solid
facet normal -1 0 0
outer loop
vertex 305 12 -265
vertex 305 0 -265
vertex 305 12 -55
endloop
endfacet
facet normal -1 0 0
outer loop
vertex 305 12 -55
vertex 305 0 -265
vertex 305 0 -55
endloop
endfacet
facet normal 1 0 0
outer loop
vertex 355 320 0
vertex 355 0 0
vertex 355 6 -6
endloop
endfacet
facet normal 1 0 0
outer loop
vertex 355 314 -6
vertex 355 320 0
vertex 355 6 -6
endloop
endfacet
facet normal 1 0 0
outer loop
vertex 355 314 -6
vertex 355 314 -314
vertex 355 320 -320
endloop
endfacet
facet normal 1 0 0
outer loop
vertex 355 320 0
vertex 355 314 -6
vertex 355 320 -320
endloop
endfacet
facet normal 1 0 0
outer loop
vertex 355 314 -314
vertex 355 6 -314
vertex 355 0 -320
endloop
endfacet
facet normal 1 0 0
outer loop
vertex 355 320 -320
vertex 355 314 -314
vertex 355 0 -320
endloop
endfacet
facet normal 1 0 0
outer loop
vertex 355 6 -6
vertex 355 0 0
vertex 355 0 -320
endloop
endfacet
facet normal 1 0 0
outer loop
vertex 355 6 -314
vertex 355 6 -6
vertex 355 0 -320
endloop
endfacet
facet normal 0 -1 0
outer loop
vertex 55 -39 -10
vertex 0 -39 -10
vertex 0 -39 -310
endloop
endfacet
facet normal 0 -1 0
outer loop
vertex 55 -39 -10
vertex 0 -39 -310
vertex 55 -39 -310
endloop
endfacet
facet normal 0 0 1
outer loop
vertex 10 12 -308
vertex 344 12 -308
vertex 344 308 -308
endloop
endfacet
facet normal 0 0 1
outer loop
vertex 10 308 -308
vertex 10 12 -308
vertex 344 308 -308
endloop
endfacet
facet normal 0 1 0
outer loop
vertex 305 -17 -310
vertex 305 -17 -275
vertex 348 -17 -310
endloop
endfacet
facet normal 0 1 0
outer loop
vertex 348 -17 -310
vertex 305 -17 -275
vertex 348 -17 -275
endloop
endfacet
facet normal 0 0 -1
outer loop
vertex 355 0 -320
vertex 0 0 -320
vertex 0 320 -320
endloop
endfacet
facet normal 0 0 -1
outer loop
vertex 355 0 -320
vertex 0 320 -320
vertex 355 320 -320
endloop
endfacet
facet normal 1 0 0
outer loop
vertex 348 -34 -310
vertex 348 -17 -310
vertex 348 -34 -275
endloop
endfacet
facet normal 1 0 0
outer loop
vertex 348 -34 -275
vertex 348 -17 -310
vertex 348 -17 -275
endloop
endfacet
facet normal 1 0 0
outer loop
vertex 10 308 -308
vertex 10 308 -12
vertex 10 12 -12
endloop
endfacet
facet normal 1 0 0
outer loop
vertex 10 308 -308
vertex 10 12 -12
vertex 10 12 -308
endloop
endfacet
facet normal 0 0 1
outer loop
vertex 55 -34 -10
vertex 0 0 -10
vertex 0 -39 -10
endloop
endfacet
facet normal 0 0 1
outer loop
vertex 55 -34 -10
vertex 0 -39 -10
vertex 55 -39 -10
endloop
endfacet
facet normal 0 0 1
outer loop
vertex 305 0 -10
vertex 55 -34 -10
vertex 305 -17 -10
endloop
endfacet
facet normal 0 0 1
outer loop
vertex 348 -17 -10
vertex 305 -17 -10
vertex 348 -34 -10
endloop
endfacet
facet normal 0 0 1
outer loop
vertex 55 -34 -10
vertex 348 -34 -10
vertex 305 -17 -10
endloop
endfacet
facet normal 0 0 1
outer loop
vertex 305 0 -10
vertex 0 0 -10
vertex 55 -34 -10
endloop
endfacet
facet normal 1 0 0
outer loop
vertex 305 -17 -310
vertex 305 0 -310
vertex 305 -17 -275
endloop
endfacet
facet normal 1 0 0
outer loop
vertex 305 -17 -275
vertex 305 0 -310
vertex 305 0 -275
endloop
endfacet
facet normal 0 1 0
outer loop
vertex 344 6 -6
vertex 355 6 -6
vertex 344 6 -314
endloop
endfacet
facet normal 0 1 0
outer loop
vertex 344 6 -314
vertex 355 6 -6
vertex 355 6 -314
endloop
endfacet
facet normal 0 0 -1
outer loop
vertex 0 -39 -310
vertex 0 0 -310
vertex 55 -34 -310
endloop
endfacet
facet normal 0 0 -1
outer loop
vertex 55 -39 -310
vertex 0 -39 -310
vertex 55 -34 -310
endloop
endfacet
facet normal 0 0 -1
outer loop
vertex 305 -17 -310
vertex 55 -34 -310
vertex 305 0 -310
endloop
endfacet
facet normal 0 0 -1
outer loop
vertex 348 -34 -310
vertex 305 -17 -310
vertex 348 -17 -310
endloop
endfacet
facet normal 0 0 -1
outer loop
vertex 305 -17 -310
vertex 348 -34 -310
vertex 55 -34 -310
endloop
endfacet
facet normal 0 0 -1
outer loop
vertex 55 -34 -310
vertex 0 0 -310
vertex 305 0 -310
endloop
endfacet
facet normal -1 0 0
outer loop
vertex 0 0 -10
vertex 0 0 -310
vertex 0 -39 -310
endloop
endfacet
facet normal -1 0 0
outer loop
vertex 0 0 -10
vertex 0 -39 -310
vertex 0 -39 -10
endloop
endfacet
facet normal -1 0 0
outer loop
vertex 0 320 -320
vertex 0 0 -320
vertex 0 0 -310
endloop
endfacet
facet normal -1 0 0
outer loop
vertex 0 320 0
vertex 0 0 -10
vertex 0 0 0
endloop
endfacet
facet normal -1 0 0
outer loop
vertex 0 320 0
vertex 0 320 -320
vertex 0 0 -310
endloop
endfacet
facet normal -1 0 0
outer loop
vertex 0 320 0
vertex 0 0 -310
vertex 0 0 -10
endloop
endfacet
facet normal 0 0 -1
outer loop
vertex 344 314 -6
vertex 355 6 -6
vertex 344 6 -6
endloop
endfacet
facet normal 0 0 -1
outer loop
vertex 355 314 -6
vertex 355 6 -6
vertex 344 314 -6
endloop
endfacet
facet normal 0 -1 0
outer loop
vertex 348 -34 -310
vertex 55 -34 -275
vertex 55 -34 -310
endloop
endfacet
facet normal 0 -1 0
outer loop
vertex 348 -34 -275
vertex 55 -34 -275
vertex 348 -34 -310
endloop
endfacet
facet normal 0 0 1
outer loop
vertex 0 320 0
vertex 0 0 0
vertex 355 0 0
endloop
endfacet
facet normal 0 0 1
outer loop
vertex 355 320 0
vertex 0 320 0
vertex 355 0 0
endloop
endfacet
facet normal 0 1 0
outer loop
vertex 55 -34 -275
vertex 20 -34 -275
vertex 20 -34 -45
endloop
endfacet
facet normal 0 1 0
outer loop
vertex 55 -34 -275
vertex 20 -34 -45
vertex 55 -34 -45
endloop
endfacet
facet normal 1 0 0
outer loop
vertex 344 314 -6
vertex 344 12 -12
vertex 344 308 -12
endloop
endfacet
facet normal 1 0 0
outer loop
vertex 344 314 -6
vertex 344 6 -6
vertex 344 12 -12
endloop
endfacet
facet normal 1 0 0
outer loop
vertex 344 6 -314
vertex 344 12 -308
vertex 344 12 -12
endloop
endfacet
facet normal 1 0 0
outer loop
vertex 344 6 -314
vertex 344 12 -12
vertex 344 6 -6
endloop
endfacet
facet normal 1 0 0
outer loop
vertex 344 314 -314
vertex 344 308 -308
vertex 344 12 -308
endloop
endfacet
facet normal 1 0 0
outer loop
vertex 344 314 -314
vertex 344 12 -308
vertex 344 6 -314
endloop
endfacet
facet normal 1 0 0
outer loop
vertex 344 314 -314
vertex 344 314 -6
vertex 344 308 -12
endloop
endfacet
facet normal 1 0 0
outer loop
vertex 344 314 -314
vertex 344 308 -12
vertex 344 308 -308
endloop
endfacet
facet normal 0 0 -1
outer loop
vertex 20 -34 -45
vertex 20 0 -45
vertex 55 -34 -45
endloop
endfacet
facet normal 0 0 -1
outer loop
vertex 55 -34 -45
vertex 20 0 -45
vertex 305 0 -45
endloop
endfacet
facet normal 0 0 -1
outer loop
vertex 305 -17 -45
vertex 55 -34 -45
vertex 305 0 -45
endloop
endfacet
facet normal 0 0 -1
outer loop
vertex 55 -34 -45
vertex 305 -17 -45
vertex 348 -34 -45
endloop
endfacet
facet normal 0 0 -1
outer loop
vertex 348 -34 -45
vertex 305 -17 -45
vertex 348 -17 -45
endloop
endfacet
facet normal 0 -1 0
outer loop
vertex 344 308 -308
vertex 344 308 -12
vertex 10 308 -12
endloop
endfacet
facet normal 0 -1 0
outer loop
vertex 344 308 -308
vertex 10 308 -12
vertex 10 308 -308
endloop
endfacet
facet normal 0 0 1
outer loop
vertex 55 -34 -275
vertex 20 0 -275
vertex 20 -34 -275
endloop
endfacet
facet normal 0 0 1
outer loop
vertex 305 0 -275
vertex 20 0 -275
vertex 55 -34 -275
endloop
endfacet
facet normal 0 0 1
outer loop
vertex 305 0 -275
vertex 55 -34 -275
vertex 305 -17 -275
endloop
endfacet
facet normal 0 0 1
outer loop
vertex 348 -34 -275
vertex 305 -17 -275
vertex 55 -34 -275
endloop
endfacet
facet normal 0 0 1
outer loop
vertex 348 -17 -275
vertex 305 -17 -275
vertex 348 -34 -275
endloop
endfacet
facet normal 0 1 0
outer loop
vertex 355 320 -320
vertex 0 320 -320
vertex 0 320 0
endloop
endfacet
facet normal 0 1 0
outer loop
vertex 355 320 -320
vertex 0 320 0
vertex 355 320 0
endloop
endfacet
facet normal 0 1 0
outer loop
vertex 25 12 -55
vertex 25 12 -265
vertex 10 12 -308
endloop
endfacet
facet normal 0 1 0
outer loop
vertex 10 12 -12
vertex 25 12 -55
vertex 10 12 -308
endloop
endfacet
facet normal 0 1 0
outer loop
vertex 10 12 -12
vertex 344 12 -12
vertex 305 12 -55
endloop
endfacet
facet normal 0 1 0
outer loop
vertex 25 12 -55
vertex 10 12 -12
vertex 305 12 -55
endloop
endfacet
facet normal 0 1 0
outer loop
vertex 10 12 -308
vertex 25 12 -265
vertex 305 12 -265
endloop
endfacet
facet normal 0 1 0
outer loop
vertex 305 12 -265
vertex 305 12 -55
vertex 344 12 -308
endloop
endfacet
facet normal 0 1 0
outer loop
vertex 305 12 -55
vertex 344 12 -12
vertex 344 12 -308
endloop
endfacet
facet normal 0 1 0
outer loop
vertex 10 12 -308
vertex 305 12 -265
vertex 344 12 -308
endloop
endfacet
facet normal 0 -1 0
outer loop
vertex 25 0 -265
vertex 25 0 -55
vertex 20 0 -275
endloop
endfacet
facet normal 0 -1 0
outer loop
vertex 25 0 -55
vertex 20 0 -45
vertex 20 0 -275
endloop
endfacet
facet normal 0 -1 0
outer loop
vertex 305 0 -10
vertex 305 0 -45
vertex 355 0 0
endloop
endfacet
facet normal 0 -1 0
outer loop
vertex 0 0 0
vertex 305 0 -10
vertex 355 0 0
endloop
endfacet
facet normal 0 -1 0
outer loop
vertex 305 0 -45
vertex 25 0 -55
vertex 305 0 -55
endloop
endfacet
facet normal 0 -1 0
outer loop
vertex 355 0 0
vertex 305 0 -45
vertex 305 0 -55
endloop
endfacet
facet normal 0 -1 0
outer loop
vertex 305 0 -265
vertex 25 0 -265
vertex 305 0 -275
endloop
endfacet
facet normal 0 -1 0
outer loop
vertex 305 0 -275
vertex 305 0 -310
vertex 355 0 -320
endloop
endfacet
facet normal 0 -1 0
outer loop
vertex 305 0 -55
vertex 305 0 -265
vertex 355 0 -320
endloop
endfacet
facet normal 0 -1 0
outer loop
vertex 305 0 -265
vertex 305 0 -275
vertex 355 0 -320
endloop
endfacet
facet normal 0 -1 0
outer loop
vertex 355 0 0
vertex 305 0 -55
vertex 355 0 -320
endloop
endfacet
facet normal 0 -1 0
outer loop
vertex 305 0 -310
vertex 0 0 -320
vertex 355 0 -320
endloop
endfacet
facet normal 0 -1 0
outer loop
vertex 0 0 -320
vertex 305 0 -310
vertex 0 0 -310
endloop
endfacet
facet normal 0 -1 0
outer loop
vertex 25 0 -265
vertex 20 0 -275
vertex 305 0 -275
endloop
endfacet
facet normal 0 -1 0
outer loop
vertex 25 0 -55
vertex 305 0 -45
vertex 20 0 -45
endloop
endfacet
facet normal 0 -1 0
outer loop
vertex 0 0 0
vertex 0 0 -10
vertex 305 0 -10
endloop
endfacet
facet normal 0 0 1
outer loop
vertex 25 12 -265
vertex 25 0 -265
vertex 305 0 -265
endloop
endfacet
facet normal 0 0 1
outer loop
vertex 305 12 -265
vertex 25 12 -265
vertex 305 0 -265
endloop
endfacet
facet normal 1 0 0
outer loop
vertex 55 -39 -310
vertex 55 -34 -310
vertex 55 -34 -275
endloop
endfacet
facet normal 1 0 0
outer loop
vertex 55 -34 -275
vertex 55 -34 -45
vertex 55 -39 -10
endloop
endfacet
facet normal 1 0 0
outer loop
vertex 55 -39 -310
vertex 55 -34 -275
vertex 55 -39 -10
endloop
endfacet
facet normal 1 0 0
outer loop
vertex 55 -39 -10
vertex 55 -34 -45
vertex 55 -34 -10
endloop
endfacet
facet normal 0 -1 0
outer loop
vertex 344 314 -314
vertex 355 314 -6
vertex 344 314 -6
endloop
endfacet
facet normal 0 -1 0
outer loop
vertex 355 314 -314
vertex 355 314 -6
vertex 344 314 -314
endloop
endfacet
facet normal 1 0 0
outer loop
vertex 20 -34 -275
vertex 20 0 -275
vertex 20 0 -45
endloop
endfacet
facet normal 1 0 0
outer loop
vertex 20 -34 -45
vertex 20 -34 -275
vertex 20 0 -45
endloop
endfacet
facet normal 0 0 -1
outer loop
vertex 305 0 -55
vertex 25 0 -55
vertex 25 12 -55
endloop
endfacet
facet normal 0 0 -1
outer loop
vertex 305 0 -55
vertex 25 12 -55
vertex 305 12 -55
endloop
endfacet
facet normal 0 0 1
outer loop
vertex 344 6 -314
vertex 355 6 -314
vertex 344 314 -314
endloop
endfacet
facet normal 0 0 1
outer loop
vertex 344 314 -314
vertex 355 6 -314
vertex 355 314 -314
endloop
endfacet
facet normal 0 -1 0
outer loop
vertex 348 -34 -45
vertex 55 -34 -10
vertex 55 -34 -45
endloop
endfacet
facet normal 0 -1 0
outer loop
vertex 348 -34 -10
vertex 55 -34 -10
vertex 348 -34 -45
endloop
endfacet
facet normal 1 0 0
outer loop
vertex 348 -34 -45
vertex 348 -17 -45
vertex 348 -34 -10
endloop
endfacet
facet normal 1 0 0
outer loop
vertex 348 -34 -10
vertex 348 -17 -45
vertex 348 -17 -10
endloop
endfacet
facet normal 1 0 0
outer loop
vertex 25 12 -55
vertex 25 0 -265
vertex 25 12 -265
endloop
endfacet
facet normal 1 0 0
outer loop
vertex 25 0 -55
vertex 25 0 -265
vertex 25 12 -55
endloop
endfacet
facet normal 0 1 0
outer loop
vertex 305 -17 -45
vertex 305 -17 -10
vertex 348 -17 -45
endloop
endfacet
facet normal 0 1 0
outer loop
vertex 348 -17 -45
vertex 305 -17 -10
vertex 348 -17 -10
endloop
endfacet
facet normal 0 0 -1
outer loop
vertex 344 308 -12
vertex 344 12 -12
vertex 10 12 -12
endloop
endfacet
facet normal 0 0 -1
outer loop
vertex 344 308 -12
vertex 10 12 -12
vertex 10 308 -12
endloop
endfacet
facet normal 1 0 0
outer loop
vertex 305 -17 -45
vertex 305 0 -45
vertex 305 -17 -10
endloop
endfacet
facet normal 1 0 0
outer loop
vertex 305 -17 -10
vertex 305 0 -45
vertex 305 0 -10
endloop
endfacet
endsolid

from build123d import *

# Parameters (mm, degrees)
SKETCH1_W            = 355
SKETCH1_H            = 320
BOSS_EXTRUDE1_DEPTH  = 320
SKETCH9_W            = 296
SKETCH9_H            = 296
CUT_EXTRUDE3_DEPTH   = 345
SKETCH10_W           = 308
SKETCH10_H           = 308
CUT_EXTRUDE4_DEPTH   = 11
SKETCH11_W           = 280
SKETCH11_H           = 210
CUT_EXTRUDE5_DEPTH   = 20
SKETCH12_W           = 285
SKETCH12_H           = 35
BOSS_EXTRUDE4_DEPTH  = 17
SKETCH14_W           = 285
SKETCH14_H           = 35
BOSS_EXTRUDE5_DEPTH  = 17
SKETCH15_W           = 328
SKETCH15_H           = 35
BOSS_EXTRUDE6_DEPTH  = 17
SKETCH16_W           = 35
SKETCH16_H           = 300
BOSS_EXTRUDE7_DEPTH  = 5
SKETCH18_W           = 20
SKETCH18_H           = 300
BOSS_EXTRUDE10_DEPTH = 39


with BuildPart() as part:
    # Sketch1 → Boss-Extrude1 (new body)
    with BuildSketch(Plane(origin=(0, 0, 0), x_dir=(1, 0, 0), z_dir=(0, 1, 0))):
        with Locations((177.5, 160)):
            Rectangle(SKETCH1_W, SKETCH1_H)
    extrude(amount=BOSS_EXTRUDE1_DEPTH)

    # Sketch9 → Cut-Extrude3 (cut)
    with BuildSketch(Plane(origin=(355, 0, 0), x_dir=(0, 0, -1), z_dir=(1, 0, 0))):
        with Locations((160, 160)):
            Rectangle(SKETCH9_W, SKETCH9_H)
    extrude(amount=-CUT_EXTRUDE3_DEPTH, mode=Mode.SUBTRACT)

    # Sketch10 → Cut-Extrude4 (cut)
    with BuildSketch(Plane(origin=(355, 0, 0), x_dir=(0, 0, -1), z_dir=(1, 0, 0))):
        with Locations((160, 160)):
            Rectangle(SKETCH10_W, SKETCH10_H)
    extrude(amount=-CUT_EXTRUDE4_DEPTH, mode=Mode.SUBTRACT)

    # Sketch11 → Cut-Extrude5 (cut)
    with BuildSketch(Plane.XZ):
        with Locations((165, -160)):
            Rectangle(SKETCH11_W, SKETCH11_H)
    extrude(amount=-CUT_EXTRUDE5_DEPTH, mode=Mode.SUBTRACT)

    # Sketch12 → Boss-Extrude4 (add)
    with BuildSketch(Plane.XZ):
        with Locations((162.5, -27.5)):
            Rectangle(SKETCH12_W, SKETCH12_H)
    extrude(amount=BOSS_EXTRUDE4_DEPTH)

    # Sketch14 → Boss-Extrude5 (add)
    with BuildSketch(Plane.XZ):
        with Locations((162.5, -292.5)):
            Rectangle(SKETCH14_W, SKETCH14_H)
    extrude(amount=BOSS_EXTRUDE5_DEPTH)

    # Sketch15 → Boss-Extrude6 (add)
    with BuildSketch(Plane.XZ.offset(17)):
        with Locations((184, -27.5)):
            Rectangle(SKETCH15_W, SKETCH15_H)
        with Locations((184, -292.5)):
            Rectangle(SKETCH15_W, SKETCH15_H)
    extrude(amount=BOSS_EXTRUDE6_DEPTH)

    # Sketch16 → Boss-Extrude7 (add)
    with BuildSketch(Plane.XZ.offset(34)):
        with Locations((37.5, -160)):
            Rectangle(SKETCH16_W, SKETCH16_H)
    extrude(amount=BOSS_EXTRUDE7_DEPTH)

    # Sketch18 → Boss-Extrude10 (add)
    with BuildSketch(Plane.XZ):
        with Locations((10, -160)):
            Rectangle(SKETCH18_W, SKETCH18_H)
    extrude(amount=BOSS_EXTRUDE10_DEPTH)


solid = part.part
